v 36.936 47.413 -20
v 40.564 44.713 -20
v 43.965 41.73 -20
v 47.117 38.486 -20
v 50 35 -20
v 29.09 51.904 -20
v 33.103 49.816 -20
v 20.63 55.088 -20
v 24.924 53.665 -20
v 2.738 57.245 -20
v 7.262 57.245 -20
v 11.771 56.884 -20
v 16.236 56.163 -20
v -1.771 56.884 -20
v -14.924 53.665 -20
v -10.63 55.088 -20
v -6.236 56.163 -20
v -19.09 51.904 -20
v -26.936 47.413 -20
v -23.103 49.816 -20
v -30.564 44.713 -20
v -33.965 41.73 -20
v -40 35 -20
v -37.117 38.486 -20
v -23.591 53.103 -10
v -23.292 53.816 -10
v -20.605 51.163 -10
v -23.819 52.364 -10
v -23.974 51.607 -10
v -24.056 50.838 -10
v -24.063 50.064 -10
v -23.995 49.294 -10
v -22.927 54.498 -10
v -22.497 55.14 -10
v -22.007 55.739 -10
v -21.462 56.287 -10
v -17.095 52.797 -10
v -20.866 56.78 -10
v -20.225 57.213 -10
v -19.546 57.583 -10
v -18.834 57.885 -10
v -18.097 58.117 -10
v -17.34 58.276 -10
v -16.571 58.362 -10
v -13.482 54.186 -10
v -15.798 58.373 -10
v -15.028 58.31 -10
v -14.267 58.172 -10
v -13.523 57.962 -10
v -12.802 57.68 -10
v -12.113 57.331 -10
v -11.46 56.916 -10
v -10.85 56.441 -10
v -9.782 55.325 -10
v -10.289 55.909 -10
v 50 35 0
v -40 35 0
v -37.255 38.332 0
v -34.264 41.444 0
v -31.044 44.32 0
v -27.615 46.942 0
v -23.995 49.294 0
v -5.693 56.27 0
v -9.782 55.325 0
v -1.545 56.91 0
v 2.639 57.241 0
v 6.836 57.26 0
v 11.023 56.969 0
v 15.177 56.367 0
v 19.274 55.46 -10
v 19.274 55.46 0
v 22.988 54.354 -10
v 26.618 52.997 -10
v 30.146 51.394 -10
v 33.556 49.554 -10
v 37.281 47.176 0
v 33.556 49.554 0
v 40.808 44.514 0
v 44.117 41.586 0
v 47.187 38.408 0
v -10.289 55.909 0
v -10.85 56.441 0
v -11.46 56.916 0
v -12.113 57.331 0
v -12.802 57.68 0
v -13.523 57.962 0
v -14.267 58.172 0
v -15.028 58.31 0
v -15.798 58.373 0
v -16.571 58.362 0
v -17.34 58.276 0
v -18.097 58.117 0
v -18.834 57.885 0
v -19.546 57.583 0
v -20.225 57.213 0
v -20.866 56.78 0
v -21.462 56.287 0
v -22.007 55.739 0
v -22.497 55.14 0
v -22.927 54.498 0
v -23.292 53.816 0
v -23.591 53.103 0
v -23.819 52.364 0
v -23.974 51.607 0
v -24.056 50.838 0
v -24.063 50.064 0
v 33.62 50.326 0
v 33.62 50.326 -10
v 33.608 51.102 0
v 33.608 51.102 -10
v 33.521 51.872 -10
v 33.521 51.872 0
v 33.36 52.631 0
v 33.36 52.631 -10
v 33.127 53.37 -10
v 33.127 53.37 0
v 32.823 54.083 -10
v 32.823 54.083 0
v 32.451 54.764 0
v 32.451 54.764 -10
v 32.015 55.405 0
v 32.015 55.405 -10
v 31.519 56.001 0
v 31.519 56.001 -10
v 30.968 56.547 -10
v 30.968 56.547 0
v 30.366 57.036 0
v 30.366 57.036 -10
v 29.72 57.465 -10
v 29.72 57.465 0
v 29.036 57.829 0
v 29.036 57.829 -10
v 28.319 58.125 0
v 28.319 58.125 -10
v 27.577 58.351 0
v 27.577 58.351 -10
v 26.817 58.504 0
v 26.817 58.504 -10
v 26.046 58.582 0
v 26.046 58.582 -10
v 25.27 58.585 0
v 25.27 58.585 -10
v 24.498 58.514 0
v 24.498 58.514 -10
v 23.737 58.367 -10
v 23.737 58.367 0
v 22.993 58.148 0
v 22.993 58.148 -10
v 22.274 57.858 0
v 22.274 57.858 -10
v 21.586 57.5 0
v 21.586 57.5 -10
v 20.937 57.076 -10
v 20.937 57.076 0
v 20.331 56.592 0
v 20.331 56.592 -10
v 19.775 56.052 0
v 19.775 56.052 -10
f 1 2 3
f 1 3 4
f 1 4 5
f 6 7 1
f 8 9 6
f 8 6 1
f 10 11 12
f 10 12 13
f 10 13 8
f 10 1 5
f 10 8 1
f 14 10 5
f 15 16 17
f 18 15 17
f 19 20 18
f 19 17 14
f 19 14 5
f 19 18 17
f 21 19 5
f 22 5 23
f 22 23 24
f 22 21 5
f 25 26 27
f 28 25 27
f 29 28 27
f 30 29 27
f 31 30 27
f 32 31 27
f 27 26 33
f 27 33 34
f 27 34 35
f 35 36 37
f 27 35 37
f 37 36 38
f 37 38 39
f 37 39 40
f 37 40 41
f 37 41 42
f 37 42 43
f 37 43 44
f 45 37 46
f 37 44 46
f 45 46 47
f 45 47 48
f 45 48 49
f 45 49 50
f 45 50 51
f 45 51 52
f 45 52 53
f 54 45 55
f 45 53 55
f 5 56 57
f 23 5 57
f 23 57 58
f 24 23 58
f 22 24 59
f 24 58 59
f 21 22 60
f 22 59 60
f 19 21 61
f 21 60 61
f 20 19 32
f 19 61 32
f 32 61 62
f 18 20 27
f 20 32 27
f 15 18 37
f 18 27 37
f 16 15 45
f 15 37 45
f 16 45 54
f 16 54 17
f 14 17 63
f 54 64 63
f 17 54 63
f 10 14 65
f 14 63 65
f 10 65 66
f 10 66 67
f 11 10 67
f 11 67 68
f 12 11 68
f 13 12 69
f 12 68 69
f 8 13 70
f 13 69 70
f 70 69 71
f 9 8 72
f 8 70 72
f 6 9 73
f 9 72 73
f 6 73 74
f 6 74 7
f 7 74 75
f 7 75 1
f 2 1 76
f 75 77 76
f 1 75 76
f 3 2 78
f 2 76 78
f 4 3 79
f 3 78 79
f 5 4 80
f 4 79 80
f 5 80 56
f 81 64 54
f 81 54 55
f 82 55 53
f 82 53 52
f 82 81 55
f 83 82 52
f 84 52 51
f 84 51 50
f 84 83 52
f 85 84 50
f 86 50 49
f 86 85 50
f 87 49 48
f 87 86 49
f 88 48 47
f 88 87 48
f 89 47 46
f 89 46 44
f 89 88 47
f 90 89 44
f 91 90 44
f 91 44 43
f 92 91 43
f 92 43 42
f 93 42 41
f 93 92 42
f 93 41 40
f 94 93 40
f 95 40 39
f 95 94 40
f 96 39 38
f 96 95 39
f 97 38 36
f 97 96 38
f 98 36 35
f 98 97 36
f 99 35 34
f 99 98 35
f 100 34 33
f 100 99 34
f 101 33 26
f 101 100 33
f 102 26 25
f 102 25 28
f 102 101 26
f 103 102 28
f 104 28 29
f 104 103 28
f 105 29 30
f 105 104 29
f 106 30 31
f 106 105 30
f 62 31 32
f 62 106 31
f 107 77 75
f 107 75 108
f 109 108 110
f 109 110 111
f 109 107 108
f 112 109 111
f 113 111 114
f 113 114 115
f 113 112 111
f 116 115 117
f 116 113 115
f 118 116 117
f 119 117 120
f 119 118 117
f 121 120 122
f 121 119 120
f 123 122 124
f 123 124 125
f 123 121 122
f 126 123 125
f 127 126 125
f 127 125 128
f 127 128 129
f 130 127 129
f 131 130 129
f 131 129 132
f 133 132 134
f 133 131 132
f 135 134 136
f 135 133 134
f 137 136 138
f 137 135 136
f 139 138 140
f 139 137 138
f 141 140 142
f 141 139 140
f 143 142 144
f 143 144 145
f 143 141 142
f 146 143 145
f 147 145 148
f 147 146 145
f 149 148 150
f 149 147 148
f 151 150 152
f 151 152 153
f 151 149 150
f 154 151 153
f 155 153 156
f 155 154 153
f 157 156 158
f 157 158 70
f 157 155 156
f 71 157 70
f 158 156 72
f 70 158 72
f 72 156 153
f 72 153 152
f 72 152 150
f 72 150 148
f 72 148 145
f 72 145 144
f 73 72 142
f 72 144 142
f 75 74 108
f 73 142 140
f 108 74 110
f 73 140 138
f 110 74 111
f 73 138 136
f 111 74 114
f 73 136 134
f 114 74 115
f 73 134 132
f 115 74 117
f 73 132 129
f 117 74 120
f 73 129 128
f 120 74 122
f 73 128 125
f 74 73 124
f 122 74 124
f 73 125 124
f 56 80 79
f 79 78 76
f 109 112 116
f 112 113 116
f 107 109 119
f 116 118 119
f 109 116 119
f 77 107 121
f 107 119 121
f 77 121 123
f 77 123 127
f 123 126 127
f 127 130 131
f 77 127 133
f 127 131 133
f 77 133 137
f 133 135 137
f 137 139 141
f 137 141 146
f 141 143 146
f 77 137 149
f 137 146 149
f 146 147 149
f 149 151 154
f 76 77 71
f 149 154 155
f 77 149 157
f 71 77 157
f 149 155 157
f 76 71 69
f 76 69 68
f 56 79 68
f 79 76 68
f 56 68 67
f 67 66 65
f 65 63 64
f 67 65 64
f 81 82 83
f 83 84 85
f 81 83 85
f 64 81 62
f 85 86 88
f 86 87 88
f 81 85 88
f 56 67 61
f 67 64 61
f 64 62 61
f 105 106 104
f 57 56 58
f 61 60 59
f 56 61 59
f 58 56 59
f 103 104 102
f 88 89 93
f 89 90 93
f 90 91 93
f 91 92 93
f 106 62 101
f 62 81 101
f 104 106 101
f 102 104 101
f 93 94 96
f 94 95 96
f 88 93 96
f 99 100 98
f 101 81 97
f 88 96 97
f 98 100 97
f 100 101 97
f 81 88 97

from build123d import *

# Parameters (mm, degrees)
BOSS_EXTRUDE2_DEPTH = 20
BOSS_EXTRUDE3_DEPTH = 10


with BuildPart() as part:
    # Sketch1 → Boss-Extrude2 (new body)
    with BuildSketch(Plane.XY):
        with BuildLine():
            Line((50, 35), (-40, 35))
            ThreePointArc((-40, 35), (5, 57.290269493), (50, 35))
        make_face()
    extrude(amount=-BOSS_EXTRUDE2_DEPTH)

    # Sketch3 → Boss-Extrude3 (add)
    with BuildSketch(Plane.XY):
        with BuildLine():
            Line((-23.995294076, 49.29407429), (-9.782013153, 55.324768004))
            ThreePointArc((-9.782013153, 55.324768004), (-19.193781446, 57.742200687), (-23.995294076, 49.29407429))
        make_face()
        with BuildLine():
            Line((19.274375244, 55.45966824), (33.55614581, 49.553545892))
            ThreePointArc((33.55614581, 49.553545892), (28.681224063, 57.986001061), (19.274375244, 55.45966824))
        make_face()
    extrude(amount=-BOSS_EXTRUDE3_DEPTH)


solid = part.part
